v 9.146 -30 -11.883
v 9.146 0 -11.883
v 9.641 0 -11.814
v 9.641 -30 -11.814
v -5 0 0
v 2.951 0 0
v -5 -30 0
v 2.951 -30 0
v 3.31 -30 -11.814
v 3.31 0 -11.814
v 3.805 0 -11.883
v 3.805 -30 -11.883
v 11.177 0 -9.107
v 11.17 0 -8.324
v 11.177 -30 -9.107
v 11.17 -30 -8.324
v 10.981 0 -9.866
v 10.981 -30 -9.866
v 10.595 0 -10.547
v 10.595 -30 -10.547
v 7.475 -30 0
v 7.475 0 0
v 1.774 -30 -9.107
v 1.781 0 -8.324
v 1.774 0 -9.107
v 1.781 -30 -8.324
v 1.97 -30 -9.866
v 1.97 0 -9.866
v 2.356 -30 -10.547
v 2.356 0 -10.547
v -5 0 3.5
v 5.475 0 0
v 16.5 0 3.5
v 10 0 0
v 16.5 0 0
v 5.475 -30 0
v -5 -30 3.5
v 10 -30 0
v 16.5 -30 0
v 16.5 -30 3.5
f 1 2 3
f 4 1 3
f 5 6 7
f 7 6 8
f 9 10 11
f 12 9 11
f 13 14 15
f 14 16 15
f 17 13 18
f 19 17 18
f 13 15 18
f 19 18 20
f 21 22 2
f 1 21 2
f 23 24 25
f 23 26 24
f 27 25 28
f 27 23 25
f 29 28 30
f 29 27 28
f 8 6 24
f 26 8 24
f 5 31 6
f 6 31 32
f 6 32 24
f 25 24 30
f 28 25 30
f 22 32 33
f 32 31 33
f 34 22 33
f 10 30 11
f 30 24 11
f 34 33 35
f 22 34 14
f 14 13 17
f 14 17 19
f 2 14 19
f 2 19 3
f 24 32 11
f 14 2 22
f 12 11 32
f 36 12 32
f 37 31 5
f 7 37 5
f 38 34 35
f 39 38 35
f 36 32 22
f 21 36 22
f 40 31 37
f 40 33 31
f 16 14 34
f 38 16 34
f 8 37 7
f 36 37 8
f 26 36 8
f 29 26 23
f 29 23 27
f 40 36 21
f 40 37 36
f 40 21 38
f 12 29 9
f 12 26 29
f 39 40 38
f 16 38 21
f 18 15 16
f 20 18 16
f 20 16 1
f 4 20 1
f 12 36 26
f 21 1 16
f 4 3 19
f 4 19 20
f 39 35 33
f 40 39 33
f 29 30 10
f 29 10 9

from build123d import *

# Parameters (mm, degrees)
F1_DEPTH = 30
F2_DEPTH = 3.5
F3_DEPTH = 5
F4_SIZE  = 2
F5_R     = 3


# Not quite as in the source:
# - a feature names something its author has since deleted; it is built from what else it names


with BuildPart() as f1:
    # F0 (on Front) → F1 (new body)
    with BuildSketch(Plane.XZ):
        Polygon((5.4754310687, 0), (2.9508621374, 0), (1.3296836853, -11.5352840725), (3.8053538572, -11.8832168249), align=None)
        Polygon((10, 0), (7.4754310687, 0), (9.1455082802, -11.8832168249), (11.6211784521, -11.5352840725), align=None)
        Polygon((0, 3.5), (0, 0), (2.9508621374, 0), (5.4754310687, 0), (7.4754310687, 0), (10, 0), (12.5, 0), (15.5, 0), (20, 0), (20, 3.5), align=None)
    extrude(amount=F1_DEPTH)

    # F2 (cut): a face of the model
    f2_faces = [f1.faces().sort_by_distance(p)[0] for p in [
        (20, -15, 1.75),
    ]]
    extrude(f2_faces, amount=-F2_DEPTH, mode=Mode.SUBTRACT)

    # F3 (add): a face of the model
    f3_faces = [f1.faces().sort_by_distance(p)[0] for p in [
        (0, -15, 1.75),
    ]]
    extrude(f3_faces, amount=F3_DEPTH)

    # F4
    f4_edges = [f1.edges().sort_by_distance(p)[0] for p in [
        (11.621178, -15, -11.535284),
        (1.329684, -15, -11.535284),
    ]]
    chamfer(f4_edges, length=F4_SIZE)

    # F5
    f5_edges = [f1.edges().sort_by_distance(p)[0] for p in [
        (1.60803, -15, -9.554748),
        (11.342832, -15, -9.554748),
    ]]
    fillet(f5_edges, radius=F5_R)


solid = f1.part
